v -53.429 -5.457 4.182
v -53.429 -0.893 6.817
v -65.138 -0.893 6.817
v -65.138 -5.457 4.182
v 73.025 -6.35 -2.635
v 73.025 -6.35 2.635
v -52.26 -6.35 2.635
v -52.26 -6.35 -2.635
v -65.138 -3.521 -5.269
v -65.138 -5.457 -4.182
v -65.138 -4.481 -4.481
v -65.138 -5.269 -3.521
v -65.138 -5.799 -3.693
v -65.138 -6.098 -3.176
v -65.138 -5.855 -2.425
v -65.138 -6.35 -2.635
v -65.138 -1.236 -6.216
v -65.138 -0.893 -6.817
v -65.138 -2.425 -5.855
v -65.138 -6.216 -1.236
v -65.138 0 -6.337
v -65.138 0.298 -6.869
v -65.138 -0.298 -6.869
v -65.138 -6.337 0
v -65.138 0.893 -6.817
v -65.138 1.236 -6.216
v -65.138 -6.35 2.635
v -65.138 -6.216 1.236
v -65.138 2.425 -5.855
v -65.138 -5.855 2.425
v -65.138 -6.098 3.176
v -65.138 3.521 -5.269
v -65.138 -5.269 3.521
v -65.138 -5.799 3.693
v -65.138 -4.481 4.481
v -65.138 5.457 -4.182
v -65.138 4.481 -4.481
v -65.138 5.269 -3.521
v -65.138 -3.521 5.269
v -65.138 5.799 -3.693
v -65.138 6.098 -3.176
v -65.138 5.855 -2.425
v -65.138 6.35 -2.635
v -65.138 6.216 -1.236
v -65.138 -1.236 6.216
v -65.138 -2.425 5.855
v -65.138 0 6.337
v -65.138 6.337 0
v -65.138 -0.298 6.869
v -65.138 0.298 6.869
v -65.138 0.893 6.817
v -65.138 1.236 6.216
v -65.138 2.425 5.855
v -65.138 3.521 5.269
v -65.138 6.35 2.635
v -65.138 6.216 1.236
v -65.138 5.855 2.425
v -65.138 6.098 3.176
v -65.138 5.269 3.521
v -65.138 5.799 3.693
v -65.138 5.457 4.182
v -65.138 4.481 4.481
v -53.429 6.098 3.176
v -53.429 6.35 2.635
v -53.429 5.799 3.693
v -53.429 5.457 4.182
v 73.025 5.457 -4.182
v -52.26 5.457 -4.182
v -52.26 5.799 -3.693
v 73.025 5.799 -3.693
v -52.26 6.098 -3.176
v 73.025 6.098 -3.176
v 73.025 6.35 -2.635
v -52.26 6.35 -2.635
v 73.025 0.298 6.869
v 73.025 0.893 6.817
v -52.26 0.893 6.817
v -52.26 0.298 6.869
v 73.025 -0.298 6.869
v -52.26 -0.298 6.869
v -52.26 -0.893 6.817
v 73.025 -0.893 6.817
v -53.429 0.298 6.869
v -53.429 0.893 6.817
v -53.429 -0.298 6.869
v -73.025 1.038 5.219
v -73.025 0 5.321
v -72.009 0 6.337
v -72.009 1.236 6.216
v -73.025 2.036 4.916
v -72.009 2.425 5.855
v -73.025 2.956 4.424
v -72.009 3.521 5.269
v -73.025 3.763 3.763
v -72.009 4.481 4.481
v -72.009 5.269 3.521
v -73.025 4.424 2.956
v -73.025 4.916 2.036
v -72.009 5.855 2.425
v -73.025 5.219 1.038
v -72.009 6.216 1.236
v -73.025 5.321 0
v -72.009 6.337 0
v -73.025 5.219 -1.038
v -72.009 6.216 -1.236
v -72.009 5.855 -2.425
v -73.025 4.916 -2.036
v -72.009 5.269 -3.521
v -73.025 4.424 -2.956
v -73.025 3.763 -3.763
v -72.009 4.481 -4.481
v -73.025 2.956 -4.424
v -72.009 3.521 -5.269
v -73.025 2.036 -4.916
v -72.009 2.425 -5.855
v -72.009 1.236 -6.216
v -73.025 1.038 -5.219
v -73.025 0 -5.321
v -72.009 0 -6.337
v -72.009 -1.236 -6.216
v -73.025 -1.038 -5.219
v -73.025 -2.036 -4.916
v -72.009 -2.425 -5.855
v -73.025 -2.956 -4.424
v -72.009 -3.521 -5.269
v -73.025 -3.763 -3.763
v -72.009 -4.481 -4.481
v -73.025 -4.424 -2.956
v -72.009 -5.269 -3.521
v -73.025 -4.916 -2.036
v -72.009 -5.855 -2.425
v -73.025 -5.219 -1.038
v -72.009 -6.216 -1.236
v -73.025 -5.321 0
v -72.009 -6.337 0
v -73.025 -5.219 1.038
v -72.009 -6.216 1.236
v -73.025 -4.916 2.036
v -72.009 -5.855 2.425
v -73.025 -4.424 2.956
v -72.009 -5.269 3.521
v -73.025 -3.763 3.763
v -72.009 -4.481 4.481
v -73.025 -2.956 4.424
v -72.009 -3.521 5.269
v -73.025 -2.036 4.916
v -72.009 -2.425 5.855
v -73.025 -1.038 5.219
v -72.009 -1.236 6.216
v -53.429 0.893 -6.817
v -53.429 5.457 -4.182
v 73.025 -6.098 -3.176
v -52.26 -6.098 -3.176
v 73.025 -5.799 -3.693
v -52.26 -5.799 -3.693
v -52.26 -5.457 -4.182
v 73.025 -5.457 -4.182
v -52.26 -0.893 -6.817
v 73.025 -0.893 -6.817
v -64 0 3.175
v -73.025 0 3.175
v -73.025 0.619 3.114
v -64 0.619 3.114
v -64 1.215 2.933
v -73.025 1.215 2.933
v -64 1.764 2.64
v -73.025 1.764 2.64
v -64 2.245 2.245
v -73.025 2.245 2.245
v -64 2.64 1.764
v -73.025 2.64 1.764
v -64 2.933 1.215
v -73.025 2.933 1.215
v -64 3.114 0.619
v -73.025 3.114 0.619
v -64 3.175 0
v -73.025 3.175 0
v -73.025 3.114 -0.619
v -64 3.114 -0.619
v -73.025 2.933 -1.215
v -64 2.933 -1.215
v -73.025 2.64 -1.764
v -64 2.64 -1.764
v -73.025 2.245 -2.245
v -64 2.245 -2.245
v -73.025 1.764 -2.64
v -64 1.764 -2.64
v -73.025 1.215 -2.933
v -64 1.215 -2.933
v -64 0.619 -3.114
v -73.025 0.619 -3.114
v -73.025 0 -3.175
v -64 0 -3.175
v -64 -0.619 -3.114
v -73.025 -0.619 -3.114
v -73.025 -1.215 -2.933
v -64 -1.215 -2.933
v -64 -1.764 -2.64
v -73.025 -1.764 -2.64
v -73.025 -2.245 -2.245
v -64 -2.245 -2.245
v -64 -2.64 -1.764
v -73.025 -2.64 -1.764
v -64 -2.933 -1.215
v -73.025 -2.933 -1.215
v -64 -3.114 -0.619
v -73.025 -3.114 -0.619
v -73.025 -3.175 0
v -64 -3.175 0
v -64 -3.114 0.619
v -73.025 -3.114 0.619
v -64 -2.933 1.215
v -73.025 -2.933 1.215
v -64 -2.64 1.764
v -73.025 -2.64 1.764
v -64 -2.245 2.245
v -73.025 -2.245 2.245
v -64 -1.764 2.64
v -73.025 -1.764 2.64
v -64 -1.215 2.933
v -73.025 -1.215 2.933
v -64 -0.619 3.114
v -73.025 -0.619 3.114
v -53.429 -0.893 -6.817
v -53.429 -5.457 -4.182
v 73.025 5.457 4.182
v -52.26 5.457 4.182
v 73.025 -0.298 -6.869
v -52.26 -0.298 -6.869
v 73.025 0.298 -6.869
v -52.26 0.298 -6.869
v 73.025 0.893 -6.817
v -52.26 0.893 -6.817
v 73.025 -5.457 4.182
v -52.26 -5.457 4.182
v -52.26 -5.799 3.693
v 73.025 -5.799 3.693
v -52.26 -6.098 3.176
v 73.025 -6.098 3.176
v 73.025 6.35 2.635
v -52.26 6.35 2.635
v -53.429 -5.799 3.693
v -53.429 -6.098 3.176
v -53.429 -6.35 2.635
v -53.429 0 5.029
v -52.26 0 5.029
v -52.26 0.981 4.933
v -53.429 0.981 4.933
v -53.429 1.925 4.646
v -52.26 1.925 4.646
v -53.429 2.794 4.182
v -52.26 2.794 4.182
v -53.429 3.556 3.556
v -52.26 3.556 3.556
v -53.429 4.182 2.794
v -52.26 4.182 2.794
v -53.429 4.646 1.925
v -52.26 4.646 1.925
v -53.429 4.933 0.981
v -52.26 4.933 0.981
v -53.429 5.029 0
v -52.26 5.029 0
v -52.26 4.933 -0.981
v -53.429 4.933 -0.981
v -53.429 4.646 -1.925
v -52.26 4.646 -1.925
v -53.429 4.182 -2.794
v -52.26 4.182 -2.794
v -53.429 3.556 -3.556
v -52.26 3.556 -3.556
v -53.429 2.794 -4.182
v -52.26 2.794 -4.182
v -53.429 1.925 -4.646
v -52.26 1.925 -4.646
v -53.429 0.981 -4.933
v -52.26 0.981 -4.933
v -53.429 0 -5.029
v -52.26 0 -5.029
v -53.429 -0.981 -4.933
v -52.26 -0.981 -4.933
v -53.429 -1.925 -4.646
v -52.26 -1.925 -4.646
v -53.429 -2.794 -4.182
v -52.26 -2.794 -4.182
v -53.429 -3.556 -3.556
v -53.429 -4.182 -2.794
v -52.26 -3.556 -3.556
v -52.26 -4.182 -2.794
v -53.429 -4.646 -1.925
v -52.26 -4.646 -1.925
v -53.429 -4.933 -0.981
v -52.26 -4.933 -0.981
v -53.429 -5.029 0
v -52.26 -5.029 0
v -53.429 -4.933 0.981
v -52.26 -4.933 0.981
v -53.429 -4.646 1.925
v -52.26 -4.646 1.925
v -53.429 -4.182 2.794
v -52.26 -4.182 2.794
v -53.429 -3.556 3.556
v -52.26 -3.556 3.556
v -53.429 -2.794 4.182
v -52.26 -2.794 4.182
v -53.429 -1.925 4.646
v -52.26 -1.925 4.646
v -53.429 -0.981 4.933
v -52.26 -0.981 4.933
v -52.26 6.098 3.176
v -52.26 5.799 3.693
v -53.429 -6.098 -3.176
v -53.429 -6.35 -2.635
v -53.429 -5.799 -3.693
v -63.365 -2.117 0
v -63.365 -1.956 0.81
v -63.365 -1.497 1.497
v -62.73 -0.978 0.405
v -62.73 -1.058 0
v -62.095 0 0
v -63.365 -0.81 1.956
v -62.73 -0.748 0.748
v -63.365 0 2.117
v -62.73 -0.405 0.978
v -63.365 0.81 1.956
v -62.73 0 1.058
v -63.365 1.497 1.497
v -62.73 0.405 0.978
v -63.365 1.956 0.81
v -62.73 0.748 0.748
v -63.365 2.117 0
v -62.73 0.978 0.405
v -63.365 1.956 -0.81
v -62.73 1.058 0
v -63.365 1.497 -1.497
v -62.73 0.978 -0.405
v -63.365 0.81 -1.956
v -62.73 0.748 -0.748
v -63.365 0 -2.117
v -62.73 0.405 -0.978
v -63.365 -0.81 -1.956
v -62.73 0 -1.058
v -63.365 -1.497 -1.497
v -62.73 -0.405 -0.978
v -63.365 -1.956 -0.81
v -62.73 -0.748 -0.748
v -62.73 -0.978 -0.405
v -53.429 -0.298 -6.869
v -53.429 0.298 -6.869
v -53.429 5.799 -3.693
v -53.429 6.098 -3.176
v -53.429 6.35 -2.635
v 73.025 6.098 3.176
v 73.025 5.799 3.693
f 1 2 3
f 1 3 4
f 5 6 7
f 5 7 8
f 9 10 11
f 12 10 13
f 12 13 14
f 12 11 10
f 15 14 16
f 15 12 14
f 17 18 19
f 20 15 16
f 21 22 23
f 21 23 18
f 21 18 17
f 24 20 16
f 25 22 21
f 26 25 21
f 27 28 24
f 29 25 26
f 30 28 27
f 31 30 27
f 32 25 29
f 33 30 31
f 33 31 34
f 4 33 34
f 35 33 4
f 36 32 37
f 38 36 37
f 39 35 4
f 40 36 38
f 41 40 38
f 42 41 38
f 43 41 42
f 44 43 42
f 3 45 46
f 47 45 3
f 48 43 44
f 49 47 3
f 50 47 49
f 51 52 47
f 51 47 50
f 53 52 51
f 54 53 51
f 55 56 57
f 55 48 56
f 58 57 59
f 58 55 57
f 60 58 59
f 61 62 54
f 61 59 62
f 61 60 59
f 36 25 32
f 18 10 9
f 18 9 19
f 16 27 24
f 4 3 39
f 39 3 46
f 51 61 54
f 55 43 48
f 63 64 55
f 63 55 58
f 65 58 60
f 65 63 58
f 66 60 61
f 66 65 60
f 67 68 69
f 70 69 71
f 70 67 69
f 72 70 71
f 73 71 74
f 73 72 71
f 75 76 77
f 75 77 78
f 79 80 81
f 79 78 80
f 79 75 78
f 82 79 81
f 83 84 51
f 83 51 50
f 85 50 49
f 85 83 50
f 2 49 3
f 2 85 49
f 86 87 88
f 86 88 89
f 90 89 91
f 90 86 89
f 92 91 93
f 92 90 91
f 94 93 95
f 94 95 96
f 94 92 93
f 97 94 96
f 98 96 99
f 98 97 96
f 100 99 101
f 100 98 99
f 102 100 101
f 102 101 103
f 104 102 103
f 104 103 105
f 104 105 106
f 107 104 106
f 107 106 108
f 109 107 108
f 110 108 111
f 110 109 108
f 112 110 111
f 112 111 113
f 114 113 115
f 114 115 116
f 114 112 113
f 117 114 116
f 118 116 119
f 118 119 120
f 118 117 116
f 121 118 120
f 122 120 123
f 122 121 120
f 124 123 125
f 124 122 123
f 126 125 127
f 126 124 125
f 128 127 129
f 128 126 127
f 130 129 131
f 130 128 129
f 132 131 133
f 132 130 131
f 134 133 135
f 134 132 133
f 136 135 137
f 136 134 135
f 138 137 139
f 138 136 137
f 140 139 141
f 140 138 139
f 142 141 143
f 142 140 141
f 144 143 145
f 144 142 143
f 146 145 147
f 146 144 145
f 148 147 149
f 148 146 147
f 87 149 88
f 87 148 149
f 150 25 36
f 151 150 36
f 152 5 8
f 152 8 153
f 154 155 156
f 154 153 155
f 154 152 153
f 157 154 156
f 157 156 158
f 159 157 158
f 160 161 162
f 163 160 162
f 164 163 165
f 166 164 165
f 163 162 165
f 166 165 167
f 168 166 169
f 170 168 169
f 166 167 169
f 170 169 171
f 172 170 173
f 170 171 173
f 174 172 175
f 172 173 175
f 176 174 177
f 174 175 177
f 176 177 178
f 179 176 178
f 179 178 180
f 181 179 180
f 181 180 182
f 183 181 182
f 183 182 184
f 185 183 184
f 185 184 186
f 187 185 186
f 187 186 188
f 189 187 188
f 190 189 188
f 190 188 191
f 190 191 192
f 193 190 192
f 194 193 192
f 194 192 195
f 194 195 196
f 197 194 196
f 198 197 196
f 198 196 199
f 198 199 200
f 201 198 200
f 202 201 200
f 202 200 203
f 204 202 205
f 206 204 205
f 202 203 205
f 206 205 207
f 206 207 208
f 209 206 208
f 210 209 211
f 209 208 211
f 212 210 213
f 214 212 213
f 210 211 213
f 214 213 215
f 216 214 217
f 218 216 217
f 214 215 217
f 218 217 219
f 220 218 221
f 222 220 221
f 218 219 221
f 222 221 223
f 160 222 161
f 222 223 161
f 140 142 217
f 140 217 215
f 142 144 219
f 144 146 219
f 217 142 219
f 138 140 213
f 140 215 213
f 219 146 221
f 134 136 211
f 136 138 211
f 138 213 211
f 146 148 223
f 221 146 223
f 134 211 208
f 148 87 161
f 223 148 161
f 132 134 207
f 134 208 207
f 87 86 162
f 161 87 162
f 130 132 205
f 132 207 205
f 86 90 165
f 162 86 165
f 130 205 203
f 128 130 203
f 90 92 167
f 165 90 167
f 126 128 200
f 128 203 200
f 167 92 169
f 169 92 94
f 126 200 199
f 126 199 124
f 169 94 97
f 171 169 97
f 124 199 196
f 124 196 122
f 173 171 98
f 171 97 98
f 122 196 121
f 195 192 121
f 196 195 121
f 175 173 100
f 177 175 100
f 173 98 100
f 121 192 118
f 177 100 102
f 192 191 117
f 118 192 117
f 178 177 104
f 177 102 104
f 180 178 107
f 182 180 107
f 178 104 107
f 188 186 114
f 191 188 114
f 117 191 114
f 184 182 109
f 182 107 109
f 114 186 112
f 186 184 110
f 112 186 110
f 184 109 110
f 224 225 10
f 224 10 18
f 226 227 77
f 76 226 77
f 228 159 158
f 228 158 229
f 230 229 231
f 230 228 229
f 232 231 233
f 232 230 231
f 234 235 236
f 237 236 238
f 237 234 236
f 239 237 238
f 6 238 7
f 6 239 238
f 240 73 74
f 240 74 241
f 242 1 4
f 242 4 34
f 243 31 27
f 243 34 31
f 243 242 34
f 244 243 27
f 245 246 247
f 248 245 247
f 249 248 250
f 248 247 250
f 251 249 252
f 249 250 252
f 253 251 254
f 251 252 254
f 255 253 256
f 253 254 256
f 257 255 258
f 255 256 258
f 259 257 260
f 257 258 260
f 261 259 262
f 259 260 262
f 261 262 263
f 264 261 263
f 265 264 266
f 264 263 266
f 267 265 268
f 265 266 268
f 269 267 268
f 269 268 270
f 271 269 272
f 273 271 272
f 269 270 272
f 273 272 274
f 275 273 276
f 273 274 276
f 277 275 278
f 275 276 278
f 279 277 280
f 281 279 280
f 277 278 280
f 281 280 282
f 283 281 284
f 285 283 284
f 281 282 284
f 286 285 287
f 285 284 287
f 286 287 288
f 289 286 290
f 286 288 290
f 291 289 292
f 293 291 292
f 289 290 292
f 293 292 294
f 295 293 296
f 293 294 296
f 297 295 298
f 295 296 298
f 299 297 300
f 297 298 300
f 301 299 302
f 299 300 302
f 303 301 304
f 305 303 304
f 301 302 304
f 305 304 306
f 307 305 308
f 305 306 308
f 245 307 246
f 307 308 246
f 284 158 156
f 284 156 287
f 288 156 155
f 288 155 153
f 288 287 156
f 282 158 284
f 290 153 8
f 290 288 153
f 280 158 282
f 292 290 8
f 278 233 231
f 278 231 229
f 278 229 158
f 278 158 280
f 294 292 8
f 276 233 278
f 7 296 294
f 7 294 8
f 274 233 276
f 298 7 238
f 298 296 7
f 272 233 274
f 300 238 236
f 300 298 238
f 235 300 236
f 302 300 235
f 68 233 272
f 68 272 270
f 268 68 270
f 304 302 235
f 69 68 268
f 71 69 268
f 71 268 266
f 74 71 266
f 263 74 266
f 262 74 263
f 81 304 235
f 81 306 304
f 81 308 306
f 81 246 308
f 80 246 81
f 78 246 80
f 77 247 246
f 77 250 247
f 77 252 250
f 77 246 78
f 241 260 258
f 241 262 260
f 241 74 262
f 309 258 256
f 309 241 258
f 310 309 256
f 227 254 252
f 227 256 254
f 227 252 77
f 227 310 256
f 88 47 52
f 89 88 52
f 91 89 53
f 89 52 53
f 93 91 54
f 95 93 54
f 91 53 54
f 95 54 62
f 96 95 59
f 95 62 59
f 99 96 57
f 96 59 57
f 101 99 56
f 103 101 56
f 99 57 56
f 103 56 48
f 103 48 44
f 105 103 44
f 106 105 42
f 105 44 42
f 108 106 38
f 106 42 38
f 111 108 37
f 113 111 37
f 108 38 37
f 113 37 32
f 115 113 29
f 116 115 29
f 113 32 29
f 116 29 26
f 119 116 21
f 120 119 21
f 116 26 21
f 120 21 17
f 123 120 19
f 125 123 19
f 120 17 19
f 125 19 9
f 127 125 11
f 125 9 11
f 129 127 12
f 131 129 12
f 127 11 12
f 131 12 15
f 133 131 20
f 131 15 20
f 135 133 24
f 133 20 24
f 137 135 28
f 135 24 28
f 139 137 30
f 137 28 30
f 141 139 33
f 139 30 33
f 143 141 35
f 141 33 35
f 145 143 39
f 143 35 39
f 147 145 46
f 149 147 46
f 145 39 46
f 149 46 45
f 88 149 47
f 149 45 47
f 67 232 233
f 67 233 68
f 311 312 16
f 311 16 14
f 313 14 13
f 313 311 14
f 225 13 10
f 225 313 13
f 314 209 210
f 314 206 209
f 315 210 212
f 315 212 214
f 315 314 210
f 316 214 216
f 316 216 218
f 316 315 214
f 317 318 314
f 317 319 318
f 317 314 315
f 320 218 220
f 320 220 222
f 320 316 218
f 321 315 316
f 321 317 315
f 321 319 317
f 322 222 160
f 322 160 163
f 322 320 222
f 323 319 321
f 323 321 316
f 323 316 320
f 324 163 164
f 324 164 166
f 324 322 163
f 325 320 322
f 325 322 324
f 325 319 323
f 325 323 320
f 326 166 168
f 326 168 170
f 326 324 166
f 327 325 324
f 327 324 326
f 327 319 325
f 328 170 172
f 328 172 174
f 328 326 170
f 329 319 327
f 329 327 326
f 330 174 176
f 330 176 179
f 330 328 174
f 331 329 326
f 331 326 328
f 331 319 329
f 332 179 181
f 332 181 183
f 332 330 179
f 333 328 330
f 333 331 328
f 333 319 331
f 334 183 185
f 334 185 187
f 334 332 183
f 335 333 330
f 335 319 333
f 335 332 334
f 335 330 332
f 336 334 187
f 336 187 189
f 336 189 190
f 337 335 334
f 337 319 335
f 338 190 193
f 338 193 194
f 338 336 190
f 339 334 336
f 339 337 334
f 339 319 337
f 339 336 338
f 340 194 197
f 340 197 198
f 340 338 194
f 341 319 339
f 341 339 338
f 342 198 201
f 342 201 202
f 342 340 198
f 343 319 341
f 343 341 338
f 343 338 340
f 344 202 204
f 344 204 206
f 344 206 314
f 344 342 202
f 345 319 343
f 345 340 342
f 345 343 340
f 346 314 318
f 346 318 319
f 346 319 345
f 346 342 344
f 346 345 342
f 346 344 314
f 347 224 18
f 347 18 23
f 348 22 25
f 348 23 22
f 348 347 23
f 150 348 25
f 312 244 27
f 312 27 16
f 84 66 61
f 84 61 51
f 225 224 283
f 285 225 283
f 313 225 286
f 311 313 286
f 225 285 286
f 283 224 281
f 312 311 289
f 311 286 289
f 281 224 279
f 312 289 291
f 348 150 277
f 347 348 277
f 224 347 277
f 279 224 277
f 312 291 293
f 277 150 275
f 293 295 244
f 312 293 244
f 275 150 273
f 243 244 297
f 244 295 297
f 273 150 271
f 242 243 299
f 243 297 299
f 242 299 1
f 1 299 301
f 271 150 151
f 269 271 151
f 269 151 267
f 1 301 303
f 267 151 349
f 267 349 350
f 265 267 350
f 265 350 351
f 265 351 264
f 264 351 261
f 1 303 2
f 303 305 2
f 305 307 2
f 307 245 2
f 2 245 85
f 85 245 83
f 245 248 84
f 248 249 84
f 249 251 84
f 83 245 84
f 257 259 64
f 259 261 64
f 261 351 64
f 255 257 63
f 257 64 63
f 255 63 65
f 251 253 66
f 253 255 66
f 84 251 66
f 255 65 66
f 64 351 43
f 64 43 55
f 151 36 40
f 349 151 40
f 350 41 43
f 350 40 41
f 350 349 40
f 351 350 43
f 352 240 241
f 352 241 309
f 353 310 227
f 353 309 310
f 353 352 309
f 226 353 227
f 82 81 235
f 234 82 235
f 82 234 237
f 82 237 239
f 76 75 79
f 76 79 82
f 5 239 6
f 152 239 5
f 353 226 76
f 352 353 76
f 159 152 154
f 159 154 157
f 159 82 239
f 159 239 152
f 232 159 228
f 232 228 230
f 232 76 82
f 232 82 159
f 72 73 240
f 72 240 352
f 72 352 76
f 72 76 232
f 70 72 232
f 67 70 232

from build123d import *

# Parameters (mm, degrees)
BOSS_EXTRUDE1_DEPTH = 73.025
CUT_EXTRUDE1_START  = -7.8867
SKETCH2_R           = 6.3373
CUT_EXTRUDE1_DEPTH  = 7.8867
CUT_EXTRUDE2_START  = -1.1684
SKETCH3_R           = 5.0292
CUT_EXTRUDE2_DEPTH  = 1.1684
SKETCH4_R           = 3.175
CUT_EXTRUDE3_DEPTH  = 9.02462
CHAMFER1_SIZE       = 1.016


with BuildPart() as part:
    # Sketch1 → Boss-Extrude1 (new, symmetric)
    with BuildSketch(Plane(origin=(0, 0, 0), x_dir=(0, 0, -1), z_dir=(1, 0, 0))):
        with BuildLine():
            Line((2.634981025, 6.35), (-2.634981025, 6.35))
            ThreePointArc((-2.634981025, 6.35), (-3.4375, 5.953924651), (-4.181770802, 5.456960506))
            Line((-4.181770802, 5.456960506), (-6.816751826, 0.893039494))
            ThreePointArc((-6.816751826, 0.893039494), (-6.875, 0), (-6.816751826, -0.893039494))
            Line((-6.816751826, -0.893039494), (-4.181770802, -5.456960506))
            ThreePointArc((-4.181770802, -5.456960506), (-3.4375, -5.953924651), (-2.634981025, -6.35))
            Line((-2.634981025, -6.35), (2.634981025, -6.35))
            ThreePointArc((2.634981025, -6.35), (3.4375, -5.953924651), (4.181770802, -5.456960506))
            Line((4.181770802, -5.456960506), (6.816751826, -0.893039494))
            ThreePointArc((6.816751826, -0.893039494), (6.875, 0), (6.816751826, 0.893039494))
            Line((6.816751826, 0.893039494), (4.181770802, 5.456960506))
            ThreePointArc((4.181770802, 5.456960506), (3.4375, 5.953924651), (2.634981025, 6.35))
        make_face()
    extrude(amount=BOSS_EXTRUDE1_DEPTH, both=True)

    # Sketch2 → Cut-Extrude1 (cut)
    with BuildSketch(Plane.ZY.offset(73.025).offset(CUT_EXTRUDE1_START)):
        with BuildLine():
            Line((-4.181770802, 5.456960506), (-6.816751826, 0.893039494))
            ThreePointArc((-6.816751826, 0.893039494), (-6.875, 0), (-6.816751826, -0.893039494))
            Line((-6.816751826, -0.893039494), (-4.181770802, -5.456960506))
            ThreePointArc((-4.181770802, -5.456960506), (-3.4375, -5.953924651), (-2.634981025, -6.35))
            Line((-2.634981025, -6.35), (2.634981025, -6.35))
            ThreePointArc((2.634981025, -6.35), (3.4375, -5.953924651), (4.181770802, -5.456960506))
            Line((4.181770802, -5.456960506), (6.816751826, -0.893039494))
            ThreePointArc((6.816751826, -0.893039494), (6.875, 0), (6.816751826, 0.893039494))
            Line((6.816751826, 0.893039494), (4.181770802, 5.456960506))
            ThreePointArc((4.181770802, 5.456960506), (3.4375, 5.953924651), (2.634981025, 6.35))
            Line((2.634981025, 6.35), (-2.634981025, 6.35))
            ThreePointArc((-2.634981025, 6.35), (-3.4375, 5.953924651), (-4.181770802, 5.456960506))
        make_face()
        Circle(SKETCH2_R, mode=Mode.SUBTRACT)
    extrude(amount=CUT_EXTRUDE1_DEPTH, mode=Mode.SUBTRACT)

    # Sketch3 → Cut-Extrude2 (cut)
    with BuildSketch(Plane.ZY.offset(53.4289).offset(CUT_EXTRUDE2_START)):
        with BuildLine():
            Line((-4.181770802, 5.456960506), (-6.816751826, 0.893039494))
            ThreePointArc((-6.816751826, 0.893039494), (-6.875, 0), (-6.816751826, -0.893039494))
            Line((-6.816751826, -0.893039494), (-4.181770802, -5.456960506))
            ThreePointArc((-4.181770802, -5.456960506), (-3.4375, -5.953924651), (-2.634981025, -6.35))
            Line((-2.634981025, -6.35), (2.634981025, -6.35))
            ThreePointArc((2.634981025, -6.35), (3.4375, -5.953924651), (4.181770802, -5.456960506))
            Line((4.181770802, -5.456960506), (6.816751826, -0.893039494))
            ThreePointArc((6.816751826, -0.893039494), (6.875, 0), (6.816751826, 0.893039494))
            Line((6.816751826, 0.893039494), (4.181770802, 5.456960506))
            ThreePointArc((4.181770802, 5.456960506), (3.4375, 5.953924651), (2.634981025, 6.35))
            Line((2.634981025, 6.35), (-2.634981025, 6.35))
            ThreePointArc((-2.634981025, 6.35), (-3.4375, 5.953924651), (-4.181770802, 5.456960506))
        make_face()
        Circle(SKETCH3_R, mode=Mode.SUBTRACT)
    extrude(amount=CUT_EXTRUDE2_DEPTH, mode=Mode.SUBTRACT)

    # Sketch4 → Cut-Extrude3 (cut)
    with BuildSketch(Plane.ZY.offset(73.025)):
        Circle(SKETCH4_R)
    extrude(amount=-CUT_EXTRUDE3_DEPTH, mode=Mode.SUBTRACT)

    # Sketch6 → Cut-Revolve1 (revolve, cut)
    with BuildSketch(Plane.XY, mode=Mode.PRIVATE) as cut_revolve1_sk:
        Polygon((-62.09538, 0), (-64.00038, 0), (-64.00038, 3.175), align=None)
    revolve(cut_revolve1_sk.sketch.rotate(Axis((-62.09538, 0, 0), (-1, 0, 0)), 180), axis=Axis((-62.09538, 0, 0), (-1, 0, 0)), mode=Mode.SUBTRACT)

    # Chamfer1
    chamfer1_edges = [part.edges().sort_by_distance(p)[0] for p in [
        (-73.025, 0, -6.3373),
    ]]
    chamfer(chamfer1_edges, length=CHAMFER1_SIZE)


solid = part.part
